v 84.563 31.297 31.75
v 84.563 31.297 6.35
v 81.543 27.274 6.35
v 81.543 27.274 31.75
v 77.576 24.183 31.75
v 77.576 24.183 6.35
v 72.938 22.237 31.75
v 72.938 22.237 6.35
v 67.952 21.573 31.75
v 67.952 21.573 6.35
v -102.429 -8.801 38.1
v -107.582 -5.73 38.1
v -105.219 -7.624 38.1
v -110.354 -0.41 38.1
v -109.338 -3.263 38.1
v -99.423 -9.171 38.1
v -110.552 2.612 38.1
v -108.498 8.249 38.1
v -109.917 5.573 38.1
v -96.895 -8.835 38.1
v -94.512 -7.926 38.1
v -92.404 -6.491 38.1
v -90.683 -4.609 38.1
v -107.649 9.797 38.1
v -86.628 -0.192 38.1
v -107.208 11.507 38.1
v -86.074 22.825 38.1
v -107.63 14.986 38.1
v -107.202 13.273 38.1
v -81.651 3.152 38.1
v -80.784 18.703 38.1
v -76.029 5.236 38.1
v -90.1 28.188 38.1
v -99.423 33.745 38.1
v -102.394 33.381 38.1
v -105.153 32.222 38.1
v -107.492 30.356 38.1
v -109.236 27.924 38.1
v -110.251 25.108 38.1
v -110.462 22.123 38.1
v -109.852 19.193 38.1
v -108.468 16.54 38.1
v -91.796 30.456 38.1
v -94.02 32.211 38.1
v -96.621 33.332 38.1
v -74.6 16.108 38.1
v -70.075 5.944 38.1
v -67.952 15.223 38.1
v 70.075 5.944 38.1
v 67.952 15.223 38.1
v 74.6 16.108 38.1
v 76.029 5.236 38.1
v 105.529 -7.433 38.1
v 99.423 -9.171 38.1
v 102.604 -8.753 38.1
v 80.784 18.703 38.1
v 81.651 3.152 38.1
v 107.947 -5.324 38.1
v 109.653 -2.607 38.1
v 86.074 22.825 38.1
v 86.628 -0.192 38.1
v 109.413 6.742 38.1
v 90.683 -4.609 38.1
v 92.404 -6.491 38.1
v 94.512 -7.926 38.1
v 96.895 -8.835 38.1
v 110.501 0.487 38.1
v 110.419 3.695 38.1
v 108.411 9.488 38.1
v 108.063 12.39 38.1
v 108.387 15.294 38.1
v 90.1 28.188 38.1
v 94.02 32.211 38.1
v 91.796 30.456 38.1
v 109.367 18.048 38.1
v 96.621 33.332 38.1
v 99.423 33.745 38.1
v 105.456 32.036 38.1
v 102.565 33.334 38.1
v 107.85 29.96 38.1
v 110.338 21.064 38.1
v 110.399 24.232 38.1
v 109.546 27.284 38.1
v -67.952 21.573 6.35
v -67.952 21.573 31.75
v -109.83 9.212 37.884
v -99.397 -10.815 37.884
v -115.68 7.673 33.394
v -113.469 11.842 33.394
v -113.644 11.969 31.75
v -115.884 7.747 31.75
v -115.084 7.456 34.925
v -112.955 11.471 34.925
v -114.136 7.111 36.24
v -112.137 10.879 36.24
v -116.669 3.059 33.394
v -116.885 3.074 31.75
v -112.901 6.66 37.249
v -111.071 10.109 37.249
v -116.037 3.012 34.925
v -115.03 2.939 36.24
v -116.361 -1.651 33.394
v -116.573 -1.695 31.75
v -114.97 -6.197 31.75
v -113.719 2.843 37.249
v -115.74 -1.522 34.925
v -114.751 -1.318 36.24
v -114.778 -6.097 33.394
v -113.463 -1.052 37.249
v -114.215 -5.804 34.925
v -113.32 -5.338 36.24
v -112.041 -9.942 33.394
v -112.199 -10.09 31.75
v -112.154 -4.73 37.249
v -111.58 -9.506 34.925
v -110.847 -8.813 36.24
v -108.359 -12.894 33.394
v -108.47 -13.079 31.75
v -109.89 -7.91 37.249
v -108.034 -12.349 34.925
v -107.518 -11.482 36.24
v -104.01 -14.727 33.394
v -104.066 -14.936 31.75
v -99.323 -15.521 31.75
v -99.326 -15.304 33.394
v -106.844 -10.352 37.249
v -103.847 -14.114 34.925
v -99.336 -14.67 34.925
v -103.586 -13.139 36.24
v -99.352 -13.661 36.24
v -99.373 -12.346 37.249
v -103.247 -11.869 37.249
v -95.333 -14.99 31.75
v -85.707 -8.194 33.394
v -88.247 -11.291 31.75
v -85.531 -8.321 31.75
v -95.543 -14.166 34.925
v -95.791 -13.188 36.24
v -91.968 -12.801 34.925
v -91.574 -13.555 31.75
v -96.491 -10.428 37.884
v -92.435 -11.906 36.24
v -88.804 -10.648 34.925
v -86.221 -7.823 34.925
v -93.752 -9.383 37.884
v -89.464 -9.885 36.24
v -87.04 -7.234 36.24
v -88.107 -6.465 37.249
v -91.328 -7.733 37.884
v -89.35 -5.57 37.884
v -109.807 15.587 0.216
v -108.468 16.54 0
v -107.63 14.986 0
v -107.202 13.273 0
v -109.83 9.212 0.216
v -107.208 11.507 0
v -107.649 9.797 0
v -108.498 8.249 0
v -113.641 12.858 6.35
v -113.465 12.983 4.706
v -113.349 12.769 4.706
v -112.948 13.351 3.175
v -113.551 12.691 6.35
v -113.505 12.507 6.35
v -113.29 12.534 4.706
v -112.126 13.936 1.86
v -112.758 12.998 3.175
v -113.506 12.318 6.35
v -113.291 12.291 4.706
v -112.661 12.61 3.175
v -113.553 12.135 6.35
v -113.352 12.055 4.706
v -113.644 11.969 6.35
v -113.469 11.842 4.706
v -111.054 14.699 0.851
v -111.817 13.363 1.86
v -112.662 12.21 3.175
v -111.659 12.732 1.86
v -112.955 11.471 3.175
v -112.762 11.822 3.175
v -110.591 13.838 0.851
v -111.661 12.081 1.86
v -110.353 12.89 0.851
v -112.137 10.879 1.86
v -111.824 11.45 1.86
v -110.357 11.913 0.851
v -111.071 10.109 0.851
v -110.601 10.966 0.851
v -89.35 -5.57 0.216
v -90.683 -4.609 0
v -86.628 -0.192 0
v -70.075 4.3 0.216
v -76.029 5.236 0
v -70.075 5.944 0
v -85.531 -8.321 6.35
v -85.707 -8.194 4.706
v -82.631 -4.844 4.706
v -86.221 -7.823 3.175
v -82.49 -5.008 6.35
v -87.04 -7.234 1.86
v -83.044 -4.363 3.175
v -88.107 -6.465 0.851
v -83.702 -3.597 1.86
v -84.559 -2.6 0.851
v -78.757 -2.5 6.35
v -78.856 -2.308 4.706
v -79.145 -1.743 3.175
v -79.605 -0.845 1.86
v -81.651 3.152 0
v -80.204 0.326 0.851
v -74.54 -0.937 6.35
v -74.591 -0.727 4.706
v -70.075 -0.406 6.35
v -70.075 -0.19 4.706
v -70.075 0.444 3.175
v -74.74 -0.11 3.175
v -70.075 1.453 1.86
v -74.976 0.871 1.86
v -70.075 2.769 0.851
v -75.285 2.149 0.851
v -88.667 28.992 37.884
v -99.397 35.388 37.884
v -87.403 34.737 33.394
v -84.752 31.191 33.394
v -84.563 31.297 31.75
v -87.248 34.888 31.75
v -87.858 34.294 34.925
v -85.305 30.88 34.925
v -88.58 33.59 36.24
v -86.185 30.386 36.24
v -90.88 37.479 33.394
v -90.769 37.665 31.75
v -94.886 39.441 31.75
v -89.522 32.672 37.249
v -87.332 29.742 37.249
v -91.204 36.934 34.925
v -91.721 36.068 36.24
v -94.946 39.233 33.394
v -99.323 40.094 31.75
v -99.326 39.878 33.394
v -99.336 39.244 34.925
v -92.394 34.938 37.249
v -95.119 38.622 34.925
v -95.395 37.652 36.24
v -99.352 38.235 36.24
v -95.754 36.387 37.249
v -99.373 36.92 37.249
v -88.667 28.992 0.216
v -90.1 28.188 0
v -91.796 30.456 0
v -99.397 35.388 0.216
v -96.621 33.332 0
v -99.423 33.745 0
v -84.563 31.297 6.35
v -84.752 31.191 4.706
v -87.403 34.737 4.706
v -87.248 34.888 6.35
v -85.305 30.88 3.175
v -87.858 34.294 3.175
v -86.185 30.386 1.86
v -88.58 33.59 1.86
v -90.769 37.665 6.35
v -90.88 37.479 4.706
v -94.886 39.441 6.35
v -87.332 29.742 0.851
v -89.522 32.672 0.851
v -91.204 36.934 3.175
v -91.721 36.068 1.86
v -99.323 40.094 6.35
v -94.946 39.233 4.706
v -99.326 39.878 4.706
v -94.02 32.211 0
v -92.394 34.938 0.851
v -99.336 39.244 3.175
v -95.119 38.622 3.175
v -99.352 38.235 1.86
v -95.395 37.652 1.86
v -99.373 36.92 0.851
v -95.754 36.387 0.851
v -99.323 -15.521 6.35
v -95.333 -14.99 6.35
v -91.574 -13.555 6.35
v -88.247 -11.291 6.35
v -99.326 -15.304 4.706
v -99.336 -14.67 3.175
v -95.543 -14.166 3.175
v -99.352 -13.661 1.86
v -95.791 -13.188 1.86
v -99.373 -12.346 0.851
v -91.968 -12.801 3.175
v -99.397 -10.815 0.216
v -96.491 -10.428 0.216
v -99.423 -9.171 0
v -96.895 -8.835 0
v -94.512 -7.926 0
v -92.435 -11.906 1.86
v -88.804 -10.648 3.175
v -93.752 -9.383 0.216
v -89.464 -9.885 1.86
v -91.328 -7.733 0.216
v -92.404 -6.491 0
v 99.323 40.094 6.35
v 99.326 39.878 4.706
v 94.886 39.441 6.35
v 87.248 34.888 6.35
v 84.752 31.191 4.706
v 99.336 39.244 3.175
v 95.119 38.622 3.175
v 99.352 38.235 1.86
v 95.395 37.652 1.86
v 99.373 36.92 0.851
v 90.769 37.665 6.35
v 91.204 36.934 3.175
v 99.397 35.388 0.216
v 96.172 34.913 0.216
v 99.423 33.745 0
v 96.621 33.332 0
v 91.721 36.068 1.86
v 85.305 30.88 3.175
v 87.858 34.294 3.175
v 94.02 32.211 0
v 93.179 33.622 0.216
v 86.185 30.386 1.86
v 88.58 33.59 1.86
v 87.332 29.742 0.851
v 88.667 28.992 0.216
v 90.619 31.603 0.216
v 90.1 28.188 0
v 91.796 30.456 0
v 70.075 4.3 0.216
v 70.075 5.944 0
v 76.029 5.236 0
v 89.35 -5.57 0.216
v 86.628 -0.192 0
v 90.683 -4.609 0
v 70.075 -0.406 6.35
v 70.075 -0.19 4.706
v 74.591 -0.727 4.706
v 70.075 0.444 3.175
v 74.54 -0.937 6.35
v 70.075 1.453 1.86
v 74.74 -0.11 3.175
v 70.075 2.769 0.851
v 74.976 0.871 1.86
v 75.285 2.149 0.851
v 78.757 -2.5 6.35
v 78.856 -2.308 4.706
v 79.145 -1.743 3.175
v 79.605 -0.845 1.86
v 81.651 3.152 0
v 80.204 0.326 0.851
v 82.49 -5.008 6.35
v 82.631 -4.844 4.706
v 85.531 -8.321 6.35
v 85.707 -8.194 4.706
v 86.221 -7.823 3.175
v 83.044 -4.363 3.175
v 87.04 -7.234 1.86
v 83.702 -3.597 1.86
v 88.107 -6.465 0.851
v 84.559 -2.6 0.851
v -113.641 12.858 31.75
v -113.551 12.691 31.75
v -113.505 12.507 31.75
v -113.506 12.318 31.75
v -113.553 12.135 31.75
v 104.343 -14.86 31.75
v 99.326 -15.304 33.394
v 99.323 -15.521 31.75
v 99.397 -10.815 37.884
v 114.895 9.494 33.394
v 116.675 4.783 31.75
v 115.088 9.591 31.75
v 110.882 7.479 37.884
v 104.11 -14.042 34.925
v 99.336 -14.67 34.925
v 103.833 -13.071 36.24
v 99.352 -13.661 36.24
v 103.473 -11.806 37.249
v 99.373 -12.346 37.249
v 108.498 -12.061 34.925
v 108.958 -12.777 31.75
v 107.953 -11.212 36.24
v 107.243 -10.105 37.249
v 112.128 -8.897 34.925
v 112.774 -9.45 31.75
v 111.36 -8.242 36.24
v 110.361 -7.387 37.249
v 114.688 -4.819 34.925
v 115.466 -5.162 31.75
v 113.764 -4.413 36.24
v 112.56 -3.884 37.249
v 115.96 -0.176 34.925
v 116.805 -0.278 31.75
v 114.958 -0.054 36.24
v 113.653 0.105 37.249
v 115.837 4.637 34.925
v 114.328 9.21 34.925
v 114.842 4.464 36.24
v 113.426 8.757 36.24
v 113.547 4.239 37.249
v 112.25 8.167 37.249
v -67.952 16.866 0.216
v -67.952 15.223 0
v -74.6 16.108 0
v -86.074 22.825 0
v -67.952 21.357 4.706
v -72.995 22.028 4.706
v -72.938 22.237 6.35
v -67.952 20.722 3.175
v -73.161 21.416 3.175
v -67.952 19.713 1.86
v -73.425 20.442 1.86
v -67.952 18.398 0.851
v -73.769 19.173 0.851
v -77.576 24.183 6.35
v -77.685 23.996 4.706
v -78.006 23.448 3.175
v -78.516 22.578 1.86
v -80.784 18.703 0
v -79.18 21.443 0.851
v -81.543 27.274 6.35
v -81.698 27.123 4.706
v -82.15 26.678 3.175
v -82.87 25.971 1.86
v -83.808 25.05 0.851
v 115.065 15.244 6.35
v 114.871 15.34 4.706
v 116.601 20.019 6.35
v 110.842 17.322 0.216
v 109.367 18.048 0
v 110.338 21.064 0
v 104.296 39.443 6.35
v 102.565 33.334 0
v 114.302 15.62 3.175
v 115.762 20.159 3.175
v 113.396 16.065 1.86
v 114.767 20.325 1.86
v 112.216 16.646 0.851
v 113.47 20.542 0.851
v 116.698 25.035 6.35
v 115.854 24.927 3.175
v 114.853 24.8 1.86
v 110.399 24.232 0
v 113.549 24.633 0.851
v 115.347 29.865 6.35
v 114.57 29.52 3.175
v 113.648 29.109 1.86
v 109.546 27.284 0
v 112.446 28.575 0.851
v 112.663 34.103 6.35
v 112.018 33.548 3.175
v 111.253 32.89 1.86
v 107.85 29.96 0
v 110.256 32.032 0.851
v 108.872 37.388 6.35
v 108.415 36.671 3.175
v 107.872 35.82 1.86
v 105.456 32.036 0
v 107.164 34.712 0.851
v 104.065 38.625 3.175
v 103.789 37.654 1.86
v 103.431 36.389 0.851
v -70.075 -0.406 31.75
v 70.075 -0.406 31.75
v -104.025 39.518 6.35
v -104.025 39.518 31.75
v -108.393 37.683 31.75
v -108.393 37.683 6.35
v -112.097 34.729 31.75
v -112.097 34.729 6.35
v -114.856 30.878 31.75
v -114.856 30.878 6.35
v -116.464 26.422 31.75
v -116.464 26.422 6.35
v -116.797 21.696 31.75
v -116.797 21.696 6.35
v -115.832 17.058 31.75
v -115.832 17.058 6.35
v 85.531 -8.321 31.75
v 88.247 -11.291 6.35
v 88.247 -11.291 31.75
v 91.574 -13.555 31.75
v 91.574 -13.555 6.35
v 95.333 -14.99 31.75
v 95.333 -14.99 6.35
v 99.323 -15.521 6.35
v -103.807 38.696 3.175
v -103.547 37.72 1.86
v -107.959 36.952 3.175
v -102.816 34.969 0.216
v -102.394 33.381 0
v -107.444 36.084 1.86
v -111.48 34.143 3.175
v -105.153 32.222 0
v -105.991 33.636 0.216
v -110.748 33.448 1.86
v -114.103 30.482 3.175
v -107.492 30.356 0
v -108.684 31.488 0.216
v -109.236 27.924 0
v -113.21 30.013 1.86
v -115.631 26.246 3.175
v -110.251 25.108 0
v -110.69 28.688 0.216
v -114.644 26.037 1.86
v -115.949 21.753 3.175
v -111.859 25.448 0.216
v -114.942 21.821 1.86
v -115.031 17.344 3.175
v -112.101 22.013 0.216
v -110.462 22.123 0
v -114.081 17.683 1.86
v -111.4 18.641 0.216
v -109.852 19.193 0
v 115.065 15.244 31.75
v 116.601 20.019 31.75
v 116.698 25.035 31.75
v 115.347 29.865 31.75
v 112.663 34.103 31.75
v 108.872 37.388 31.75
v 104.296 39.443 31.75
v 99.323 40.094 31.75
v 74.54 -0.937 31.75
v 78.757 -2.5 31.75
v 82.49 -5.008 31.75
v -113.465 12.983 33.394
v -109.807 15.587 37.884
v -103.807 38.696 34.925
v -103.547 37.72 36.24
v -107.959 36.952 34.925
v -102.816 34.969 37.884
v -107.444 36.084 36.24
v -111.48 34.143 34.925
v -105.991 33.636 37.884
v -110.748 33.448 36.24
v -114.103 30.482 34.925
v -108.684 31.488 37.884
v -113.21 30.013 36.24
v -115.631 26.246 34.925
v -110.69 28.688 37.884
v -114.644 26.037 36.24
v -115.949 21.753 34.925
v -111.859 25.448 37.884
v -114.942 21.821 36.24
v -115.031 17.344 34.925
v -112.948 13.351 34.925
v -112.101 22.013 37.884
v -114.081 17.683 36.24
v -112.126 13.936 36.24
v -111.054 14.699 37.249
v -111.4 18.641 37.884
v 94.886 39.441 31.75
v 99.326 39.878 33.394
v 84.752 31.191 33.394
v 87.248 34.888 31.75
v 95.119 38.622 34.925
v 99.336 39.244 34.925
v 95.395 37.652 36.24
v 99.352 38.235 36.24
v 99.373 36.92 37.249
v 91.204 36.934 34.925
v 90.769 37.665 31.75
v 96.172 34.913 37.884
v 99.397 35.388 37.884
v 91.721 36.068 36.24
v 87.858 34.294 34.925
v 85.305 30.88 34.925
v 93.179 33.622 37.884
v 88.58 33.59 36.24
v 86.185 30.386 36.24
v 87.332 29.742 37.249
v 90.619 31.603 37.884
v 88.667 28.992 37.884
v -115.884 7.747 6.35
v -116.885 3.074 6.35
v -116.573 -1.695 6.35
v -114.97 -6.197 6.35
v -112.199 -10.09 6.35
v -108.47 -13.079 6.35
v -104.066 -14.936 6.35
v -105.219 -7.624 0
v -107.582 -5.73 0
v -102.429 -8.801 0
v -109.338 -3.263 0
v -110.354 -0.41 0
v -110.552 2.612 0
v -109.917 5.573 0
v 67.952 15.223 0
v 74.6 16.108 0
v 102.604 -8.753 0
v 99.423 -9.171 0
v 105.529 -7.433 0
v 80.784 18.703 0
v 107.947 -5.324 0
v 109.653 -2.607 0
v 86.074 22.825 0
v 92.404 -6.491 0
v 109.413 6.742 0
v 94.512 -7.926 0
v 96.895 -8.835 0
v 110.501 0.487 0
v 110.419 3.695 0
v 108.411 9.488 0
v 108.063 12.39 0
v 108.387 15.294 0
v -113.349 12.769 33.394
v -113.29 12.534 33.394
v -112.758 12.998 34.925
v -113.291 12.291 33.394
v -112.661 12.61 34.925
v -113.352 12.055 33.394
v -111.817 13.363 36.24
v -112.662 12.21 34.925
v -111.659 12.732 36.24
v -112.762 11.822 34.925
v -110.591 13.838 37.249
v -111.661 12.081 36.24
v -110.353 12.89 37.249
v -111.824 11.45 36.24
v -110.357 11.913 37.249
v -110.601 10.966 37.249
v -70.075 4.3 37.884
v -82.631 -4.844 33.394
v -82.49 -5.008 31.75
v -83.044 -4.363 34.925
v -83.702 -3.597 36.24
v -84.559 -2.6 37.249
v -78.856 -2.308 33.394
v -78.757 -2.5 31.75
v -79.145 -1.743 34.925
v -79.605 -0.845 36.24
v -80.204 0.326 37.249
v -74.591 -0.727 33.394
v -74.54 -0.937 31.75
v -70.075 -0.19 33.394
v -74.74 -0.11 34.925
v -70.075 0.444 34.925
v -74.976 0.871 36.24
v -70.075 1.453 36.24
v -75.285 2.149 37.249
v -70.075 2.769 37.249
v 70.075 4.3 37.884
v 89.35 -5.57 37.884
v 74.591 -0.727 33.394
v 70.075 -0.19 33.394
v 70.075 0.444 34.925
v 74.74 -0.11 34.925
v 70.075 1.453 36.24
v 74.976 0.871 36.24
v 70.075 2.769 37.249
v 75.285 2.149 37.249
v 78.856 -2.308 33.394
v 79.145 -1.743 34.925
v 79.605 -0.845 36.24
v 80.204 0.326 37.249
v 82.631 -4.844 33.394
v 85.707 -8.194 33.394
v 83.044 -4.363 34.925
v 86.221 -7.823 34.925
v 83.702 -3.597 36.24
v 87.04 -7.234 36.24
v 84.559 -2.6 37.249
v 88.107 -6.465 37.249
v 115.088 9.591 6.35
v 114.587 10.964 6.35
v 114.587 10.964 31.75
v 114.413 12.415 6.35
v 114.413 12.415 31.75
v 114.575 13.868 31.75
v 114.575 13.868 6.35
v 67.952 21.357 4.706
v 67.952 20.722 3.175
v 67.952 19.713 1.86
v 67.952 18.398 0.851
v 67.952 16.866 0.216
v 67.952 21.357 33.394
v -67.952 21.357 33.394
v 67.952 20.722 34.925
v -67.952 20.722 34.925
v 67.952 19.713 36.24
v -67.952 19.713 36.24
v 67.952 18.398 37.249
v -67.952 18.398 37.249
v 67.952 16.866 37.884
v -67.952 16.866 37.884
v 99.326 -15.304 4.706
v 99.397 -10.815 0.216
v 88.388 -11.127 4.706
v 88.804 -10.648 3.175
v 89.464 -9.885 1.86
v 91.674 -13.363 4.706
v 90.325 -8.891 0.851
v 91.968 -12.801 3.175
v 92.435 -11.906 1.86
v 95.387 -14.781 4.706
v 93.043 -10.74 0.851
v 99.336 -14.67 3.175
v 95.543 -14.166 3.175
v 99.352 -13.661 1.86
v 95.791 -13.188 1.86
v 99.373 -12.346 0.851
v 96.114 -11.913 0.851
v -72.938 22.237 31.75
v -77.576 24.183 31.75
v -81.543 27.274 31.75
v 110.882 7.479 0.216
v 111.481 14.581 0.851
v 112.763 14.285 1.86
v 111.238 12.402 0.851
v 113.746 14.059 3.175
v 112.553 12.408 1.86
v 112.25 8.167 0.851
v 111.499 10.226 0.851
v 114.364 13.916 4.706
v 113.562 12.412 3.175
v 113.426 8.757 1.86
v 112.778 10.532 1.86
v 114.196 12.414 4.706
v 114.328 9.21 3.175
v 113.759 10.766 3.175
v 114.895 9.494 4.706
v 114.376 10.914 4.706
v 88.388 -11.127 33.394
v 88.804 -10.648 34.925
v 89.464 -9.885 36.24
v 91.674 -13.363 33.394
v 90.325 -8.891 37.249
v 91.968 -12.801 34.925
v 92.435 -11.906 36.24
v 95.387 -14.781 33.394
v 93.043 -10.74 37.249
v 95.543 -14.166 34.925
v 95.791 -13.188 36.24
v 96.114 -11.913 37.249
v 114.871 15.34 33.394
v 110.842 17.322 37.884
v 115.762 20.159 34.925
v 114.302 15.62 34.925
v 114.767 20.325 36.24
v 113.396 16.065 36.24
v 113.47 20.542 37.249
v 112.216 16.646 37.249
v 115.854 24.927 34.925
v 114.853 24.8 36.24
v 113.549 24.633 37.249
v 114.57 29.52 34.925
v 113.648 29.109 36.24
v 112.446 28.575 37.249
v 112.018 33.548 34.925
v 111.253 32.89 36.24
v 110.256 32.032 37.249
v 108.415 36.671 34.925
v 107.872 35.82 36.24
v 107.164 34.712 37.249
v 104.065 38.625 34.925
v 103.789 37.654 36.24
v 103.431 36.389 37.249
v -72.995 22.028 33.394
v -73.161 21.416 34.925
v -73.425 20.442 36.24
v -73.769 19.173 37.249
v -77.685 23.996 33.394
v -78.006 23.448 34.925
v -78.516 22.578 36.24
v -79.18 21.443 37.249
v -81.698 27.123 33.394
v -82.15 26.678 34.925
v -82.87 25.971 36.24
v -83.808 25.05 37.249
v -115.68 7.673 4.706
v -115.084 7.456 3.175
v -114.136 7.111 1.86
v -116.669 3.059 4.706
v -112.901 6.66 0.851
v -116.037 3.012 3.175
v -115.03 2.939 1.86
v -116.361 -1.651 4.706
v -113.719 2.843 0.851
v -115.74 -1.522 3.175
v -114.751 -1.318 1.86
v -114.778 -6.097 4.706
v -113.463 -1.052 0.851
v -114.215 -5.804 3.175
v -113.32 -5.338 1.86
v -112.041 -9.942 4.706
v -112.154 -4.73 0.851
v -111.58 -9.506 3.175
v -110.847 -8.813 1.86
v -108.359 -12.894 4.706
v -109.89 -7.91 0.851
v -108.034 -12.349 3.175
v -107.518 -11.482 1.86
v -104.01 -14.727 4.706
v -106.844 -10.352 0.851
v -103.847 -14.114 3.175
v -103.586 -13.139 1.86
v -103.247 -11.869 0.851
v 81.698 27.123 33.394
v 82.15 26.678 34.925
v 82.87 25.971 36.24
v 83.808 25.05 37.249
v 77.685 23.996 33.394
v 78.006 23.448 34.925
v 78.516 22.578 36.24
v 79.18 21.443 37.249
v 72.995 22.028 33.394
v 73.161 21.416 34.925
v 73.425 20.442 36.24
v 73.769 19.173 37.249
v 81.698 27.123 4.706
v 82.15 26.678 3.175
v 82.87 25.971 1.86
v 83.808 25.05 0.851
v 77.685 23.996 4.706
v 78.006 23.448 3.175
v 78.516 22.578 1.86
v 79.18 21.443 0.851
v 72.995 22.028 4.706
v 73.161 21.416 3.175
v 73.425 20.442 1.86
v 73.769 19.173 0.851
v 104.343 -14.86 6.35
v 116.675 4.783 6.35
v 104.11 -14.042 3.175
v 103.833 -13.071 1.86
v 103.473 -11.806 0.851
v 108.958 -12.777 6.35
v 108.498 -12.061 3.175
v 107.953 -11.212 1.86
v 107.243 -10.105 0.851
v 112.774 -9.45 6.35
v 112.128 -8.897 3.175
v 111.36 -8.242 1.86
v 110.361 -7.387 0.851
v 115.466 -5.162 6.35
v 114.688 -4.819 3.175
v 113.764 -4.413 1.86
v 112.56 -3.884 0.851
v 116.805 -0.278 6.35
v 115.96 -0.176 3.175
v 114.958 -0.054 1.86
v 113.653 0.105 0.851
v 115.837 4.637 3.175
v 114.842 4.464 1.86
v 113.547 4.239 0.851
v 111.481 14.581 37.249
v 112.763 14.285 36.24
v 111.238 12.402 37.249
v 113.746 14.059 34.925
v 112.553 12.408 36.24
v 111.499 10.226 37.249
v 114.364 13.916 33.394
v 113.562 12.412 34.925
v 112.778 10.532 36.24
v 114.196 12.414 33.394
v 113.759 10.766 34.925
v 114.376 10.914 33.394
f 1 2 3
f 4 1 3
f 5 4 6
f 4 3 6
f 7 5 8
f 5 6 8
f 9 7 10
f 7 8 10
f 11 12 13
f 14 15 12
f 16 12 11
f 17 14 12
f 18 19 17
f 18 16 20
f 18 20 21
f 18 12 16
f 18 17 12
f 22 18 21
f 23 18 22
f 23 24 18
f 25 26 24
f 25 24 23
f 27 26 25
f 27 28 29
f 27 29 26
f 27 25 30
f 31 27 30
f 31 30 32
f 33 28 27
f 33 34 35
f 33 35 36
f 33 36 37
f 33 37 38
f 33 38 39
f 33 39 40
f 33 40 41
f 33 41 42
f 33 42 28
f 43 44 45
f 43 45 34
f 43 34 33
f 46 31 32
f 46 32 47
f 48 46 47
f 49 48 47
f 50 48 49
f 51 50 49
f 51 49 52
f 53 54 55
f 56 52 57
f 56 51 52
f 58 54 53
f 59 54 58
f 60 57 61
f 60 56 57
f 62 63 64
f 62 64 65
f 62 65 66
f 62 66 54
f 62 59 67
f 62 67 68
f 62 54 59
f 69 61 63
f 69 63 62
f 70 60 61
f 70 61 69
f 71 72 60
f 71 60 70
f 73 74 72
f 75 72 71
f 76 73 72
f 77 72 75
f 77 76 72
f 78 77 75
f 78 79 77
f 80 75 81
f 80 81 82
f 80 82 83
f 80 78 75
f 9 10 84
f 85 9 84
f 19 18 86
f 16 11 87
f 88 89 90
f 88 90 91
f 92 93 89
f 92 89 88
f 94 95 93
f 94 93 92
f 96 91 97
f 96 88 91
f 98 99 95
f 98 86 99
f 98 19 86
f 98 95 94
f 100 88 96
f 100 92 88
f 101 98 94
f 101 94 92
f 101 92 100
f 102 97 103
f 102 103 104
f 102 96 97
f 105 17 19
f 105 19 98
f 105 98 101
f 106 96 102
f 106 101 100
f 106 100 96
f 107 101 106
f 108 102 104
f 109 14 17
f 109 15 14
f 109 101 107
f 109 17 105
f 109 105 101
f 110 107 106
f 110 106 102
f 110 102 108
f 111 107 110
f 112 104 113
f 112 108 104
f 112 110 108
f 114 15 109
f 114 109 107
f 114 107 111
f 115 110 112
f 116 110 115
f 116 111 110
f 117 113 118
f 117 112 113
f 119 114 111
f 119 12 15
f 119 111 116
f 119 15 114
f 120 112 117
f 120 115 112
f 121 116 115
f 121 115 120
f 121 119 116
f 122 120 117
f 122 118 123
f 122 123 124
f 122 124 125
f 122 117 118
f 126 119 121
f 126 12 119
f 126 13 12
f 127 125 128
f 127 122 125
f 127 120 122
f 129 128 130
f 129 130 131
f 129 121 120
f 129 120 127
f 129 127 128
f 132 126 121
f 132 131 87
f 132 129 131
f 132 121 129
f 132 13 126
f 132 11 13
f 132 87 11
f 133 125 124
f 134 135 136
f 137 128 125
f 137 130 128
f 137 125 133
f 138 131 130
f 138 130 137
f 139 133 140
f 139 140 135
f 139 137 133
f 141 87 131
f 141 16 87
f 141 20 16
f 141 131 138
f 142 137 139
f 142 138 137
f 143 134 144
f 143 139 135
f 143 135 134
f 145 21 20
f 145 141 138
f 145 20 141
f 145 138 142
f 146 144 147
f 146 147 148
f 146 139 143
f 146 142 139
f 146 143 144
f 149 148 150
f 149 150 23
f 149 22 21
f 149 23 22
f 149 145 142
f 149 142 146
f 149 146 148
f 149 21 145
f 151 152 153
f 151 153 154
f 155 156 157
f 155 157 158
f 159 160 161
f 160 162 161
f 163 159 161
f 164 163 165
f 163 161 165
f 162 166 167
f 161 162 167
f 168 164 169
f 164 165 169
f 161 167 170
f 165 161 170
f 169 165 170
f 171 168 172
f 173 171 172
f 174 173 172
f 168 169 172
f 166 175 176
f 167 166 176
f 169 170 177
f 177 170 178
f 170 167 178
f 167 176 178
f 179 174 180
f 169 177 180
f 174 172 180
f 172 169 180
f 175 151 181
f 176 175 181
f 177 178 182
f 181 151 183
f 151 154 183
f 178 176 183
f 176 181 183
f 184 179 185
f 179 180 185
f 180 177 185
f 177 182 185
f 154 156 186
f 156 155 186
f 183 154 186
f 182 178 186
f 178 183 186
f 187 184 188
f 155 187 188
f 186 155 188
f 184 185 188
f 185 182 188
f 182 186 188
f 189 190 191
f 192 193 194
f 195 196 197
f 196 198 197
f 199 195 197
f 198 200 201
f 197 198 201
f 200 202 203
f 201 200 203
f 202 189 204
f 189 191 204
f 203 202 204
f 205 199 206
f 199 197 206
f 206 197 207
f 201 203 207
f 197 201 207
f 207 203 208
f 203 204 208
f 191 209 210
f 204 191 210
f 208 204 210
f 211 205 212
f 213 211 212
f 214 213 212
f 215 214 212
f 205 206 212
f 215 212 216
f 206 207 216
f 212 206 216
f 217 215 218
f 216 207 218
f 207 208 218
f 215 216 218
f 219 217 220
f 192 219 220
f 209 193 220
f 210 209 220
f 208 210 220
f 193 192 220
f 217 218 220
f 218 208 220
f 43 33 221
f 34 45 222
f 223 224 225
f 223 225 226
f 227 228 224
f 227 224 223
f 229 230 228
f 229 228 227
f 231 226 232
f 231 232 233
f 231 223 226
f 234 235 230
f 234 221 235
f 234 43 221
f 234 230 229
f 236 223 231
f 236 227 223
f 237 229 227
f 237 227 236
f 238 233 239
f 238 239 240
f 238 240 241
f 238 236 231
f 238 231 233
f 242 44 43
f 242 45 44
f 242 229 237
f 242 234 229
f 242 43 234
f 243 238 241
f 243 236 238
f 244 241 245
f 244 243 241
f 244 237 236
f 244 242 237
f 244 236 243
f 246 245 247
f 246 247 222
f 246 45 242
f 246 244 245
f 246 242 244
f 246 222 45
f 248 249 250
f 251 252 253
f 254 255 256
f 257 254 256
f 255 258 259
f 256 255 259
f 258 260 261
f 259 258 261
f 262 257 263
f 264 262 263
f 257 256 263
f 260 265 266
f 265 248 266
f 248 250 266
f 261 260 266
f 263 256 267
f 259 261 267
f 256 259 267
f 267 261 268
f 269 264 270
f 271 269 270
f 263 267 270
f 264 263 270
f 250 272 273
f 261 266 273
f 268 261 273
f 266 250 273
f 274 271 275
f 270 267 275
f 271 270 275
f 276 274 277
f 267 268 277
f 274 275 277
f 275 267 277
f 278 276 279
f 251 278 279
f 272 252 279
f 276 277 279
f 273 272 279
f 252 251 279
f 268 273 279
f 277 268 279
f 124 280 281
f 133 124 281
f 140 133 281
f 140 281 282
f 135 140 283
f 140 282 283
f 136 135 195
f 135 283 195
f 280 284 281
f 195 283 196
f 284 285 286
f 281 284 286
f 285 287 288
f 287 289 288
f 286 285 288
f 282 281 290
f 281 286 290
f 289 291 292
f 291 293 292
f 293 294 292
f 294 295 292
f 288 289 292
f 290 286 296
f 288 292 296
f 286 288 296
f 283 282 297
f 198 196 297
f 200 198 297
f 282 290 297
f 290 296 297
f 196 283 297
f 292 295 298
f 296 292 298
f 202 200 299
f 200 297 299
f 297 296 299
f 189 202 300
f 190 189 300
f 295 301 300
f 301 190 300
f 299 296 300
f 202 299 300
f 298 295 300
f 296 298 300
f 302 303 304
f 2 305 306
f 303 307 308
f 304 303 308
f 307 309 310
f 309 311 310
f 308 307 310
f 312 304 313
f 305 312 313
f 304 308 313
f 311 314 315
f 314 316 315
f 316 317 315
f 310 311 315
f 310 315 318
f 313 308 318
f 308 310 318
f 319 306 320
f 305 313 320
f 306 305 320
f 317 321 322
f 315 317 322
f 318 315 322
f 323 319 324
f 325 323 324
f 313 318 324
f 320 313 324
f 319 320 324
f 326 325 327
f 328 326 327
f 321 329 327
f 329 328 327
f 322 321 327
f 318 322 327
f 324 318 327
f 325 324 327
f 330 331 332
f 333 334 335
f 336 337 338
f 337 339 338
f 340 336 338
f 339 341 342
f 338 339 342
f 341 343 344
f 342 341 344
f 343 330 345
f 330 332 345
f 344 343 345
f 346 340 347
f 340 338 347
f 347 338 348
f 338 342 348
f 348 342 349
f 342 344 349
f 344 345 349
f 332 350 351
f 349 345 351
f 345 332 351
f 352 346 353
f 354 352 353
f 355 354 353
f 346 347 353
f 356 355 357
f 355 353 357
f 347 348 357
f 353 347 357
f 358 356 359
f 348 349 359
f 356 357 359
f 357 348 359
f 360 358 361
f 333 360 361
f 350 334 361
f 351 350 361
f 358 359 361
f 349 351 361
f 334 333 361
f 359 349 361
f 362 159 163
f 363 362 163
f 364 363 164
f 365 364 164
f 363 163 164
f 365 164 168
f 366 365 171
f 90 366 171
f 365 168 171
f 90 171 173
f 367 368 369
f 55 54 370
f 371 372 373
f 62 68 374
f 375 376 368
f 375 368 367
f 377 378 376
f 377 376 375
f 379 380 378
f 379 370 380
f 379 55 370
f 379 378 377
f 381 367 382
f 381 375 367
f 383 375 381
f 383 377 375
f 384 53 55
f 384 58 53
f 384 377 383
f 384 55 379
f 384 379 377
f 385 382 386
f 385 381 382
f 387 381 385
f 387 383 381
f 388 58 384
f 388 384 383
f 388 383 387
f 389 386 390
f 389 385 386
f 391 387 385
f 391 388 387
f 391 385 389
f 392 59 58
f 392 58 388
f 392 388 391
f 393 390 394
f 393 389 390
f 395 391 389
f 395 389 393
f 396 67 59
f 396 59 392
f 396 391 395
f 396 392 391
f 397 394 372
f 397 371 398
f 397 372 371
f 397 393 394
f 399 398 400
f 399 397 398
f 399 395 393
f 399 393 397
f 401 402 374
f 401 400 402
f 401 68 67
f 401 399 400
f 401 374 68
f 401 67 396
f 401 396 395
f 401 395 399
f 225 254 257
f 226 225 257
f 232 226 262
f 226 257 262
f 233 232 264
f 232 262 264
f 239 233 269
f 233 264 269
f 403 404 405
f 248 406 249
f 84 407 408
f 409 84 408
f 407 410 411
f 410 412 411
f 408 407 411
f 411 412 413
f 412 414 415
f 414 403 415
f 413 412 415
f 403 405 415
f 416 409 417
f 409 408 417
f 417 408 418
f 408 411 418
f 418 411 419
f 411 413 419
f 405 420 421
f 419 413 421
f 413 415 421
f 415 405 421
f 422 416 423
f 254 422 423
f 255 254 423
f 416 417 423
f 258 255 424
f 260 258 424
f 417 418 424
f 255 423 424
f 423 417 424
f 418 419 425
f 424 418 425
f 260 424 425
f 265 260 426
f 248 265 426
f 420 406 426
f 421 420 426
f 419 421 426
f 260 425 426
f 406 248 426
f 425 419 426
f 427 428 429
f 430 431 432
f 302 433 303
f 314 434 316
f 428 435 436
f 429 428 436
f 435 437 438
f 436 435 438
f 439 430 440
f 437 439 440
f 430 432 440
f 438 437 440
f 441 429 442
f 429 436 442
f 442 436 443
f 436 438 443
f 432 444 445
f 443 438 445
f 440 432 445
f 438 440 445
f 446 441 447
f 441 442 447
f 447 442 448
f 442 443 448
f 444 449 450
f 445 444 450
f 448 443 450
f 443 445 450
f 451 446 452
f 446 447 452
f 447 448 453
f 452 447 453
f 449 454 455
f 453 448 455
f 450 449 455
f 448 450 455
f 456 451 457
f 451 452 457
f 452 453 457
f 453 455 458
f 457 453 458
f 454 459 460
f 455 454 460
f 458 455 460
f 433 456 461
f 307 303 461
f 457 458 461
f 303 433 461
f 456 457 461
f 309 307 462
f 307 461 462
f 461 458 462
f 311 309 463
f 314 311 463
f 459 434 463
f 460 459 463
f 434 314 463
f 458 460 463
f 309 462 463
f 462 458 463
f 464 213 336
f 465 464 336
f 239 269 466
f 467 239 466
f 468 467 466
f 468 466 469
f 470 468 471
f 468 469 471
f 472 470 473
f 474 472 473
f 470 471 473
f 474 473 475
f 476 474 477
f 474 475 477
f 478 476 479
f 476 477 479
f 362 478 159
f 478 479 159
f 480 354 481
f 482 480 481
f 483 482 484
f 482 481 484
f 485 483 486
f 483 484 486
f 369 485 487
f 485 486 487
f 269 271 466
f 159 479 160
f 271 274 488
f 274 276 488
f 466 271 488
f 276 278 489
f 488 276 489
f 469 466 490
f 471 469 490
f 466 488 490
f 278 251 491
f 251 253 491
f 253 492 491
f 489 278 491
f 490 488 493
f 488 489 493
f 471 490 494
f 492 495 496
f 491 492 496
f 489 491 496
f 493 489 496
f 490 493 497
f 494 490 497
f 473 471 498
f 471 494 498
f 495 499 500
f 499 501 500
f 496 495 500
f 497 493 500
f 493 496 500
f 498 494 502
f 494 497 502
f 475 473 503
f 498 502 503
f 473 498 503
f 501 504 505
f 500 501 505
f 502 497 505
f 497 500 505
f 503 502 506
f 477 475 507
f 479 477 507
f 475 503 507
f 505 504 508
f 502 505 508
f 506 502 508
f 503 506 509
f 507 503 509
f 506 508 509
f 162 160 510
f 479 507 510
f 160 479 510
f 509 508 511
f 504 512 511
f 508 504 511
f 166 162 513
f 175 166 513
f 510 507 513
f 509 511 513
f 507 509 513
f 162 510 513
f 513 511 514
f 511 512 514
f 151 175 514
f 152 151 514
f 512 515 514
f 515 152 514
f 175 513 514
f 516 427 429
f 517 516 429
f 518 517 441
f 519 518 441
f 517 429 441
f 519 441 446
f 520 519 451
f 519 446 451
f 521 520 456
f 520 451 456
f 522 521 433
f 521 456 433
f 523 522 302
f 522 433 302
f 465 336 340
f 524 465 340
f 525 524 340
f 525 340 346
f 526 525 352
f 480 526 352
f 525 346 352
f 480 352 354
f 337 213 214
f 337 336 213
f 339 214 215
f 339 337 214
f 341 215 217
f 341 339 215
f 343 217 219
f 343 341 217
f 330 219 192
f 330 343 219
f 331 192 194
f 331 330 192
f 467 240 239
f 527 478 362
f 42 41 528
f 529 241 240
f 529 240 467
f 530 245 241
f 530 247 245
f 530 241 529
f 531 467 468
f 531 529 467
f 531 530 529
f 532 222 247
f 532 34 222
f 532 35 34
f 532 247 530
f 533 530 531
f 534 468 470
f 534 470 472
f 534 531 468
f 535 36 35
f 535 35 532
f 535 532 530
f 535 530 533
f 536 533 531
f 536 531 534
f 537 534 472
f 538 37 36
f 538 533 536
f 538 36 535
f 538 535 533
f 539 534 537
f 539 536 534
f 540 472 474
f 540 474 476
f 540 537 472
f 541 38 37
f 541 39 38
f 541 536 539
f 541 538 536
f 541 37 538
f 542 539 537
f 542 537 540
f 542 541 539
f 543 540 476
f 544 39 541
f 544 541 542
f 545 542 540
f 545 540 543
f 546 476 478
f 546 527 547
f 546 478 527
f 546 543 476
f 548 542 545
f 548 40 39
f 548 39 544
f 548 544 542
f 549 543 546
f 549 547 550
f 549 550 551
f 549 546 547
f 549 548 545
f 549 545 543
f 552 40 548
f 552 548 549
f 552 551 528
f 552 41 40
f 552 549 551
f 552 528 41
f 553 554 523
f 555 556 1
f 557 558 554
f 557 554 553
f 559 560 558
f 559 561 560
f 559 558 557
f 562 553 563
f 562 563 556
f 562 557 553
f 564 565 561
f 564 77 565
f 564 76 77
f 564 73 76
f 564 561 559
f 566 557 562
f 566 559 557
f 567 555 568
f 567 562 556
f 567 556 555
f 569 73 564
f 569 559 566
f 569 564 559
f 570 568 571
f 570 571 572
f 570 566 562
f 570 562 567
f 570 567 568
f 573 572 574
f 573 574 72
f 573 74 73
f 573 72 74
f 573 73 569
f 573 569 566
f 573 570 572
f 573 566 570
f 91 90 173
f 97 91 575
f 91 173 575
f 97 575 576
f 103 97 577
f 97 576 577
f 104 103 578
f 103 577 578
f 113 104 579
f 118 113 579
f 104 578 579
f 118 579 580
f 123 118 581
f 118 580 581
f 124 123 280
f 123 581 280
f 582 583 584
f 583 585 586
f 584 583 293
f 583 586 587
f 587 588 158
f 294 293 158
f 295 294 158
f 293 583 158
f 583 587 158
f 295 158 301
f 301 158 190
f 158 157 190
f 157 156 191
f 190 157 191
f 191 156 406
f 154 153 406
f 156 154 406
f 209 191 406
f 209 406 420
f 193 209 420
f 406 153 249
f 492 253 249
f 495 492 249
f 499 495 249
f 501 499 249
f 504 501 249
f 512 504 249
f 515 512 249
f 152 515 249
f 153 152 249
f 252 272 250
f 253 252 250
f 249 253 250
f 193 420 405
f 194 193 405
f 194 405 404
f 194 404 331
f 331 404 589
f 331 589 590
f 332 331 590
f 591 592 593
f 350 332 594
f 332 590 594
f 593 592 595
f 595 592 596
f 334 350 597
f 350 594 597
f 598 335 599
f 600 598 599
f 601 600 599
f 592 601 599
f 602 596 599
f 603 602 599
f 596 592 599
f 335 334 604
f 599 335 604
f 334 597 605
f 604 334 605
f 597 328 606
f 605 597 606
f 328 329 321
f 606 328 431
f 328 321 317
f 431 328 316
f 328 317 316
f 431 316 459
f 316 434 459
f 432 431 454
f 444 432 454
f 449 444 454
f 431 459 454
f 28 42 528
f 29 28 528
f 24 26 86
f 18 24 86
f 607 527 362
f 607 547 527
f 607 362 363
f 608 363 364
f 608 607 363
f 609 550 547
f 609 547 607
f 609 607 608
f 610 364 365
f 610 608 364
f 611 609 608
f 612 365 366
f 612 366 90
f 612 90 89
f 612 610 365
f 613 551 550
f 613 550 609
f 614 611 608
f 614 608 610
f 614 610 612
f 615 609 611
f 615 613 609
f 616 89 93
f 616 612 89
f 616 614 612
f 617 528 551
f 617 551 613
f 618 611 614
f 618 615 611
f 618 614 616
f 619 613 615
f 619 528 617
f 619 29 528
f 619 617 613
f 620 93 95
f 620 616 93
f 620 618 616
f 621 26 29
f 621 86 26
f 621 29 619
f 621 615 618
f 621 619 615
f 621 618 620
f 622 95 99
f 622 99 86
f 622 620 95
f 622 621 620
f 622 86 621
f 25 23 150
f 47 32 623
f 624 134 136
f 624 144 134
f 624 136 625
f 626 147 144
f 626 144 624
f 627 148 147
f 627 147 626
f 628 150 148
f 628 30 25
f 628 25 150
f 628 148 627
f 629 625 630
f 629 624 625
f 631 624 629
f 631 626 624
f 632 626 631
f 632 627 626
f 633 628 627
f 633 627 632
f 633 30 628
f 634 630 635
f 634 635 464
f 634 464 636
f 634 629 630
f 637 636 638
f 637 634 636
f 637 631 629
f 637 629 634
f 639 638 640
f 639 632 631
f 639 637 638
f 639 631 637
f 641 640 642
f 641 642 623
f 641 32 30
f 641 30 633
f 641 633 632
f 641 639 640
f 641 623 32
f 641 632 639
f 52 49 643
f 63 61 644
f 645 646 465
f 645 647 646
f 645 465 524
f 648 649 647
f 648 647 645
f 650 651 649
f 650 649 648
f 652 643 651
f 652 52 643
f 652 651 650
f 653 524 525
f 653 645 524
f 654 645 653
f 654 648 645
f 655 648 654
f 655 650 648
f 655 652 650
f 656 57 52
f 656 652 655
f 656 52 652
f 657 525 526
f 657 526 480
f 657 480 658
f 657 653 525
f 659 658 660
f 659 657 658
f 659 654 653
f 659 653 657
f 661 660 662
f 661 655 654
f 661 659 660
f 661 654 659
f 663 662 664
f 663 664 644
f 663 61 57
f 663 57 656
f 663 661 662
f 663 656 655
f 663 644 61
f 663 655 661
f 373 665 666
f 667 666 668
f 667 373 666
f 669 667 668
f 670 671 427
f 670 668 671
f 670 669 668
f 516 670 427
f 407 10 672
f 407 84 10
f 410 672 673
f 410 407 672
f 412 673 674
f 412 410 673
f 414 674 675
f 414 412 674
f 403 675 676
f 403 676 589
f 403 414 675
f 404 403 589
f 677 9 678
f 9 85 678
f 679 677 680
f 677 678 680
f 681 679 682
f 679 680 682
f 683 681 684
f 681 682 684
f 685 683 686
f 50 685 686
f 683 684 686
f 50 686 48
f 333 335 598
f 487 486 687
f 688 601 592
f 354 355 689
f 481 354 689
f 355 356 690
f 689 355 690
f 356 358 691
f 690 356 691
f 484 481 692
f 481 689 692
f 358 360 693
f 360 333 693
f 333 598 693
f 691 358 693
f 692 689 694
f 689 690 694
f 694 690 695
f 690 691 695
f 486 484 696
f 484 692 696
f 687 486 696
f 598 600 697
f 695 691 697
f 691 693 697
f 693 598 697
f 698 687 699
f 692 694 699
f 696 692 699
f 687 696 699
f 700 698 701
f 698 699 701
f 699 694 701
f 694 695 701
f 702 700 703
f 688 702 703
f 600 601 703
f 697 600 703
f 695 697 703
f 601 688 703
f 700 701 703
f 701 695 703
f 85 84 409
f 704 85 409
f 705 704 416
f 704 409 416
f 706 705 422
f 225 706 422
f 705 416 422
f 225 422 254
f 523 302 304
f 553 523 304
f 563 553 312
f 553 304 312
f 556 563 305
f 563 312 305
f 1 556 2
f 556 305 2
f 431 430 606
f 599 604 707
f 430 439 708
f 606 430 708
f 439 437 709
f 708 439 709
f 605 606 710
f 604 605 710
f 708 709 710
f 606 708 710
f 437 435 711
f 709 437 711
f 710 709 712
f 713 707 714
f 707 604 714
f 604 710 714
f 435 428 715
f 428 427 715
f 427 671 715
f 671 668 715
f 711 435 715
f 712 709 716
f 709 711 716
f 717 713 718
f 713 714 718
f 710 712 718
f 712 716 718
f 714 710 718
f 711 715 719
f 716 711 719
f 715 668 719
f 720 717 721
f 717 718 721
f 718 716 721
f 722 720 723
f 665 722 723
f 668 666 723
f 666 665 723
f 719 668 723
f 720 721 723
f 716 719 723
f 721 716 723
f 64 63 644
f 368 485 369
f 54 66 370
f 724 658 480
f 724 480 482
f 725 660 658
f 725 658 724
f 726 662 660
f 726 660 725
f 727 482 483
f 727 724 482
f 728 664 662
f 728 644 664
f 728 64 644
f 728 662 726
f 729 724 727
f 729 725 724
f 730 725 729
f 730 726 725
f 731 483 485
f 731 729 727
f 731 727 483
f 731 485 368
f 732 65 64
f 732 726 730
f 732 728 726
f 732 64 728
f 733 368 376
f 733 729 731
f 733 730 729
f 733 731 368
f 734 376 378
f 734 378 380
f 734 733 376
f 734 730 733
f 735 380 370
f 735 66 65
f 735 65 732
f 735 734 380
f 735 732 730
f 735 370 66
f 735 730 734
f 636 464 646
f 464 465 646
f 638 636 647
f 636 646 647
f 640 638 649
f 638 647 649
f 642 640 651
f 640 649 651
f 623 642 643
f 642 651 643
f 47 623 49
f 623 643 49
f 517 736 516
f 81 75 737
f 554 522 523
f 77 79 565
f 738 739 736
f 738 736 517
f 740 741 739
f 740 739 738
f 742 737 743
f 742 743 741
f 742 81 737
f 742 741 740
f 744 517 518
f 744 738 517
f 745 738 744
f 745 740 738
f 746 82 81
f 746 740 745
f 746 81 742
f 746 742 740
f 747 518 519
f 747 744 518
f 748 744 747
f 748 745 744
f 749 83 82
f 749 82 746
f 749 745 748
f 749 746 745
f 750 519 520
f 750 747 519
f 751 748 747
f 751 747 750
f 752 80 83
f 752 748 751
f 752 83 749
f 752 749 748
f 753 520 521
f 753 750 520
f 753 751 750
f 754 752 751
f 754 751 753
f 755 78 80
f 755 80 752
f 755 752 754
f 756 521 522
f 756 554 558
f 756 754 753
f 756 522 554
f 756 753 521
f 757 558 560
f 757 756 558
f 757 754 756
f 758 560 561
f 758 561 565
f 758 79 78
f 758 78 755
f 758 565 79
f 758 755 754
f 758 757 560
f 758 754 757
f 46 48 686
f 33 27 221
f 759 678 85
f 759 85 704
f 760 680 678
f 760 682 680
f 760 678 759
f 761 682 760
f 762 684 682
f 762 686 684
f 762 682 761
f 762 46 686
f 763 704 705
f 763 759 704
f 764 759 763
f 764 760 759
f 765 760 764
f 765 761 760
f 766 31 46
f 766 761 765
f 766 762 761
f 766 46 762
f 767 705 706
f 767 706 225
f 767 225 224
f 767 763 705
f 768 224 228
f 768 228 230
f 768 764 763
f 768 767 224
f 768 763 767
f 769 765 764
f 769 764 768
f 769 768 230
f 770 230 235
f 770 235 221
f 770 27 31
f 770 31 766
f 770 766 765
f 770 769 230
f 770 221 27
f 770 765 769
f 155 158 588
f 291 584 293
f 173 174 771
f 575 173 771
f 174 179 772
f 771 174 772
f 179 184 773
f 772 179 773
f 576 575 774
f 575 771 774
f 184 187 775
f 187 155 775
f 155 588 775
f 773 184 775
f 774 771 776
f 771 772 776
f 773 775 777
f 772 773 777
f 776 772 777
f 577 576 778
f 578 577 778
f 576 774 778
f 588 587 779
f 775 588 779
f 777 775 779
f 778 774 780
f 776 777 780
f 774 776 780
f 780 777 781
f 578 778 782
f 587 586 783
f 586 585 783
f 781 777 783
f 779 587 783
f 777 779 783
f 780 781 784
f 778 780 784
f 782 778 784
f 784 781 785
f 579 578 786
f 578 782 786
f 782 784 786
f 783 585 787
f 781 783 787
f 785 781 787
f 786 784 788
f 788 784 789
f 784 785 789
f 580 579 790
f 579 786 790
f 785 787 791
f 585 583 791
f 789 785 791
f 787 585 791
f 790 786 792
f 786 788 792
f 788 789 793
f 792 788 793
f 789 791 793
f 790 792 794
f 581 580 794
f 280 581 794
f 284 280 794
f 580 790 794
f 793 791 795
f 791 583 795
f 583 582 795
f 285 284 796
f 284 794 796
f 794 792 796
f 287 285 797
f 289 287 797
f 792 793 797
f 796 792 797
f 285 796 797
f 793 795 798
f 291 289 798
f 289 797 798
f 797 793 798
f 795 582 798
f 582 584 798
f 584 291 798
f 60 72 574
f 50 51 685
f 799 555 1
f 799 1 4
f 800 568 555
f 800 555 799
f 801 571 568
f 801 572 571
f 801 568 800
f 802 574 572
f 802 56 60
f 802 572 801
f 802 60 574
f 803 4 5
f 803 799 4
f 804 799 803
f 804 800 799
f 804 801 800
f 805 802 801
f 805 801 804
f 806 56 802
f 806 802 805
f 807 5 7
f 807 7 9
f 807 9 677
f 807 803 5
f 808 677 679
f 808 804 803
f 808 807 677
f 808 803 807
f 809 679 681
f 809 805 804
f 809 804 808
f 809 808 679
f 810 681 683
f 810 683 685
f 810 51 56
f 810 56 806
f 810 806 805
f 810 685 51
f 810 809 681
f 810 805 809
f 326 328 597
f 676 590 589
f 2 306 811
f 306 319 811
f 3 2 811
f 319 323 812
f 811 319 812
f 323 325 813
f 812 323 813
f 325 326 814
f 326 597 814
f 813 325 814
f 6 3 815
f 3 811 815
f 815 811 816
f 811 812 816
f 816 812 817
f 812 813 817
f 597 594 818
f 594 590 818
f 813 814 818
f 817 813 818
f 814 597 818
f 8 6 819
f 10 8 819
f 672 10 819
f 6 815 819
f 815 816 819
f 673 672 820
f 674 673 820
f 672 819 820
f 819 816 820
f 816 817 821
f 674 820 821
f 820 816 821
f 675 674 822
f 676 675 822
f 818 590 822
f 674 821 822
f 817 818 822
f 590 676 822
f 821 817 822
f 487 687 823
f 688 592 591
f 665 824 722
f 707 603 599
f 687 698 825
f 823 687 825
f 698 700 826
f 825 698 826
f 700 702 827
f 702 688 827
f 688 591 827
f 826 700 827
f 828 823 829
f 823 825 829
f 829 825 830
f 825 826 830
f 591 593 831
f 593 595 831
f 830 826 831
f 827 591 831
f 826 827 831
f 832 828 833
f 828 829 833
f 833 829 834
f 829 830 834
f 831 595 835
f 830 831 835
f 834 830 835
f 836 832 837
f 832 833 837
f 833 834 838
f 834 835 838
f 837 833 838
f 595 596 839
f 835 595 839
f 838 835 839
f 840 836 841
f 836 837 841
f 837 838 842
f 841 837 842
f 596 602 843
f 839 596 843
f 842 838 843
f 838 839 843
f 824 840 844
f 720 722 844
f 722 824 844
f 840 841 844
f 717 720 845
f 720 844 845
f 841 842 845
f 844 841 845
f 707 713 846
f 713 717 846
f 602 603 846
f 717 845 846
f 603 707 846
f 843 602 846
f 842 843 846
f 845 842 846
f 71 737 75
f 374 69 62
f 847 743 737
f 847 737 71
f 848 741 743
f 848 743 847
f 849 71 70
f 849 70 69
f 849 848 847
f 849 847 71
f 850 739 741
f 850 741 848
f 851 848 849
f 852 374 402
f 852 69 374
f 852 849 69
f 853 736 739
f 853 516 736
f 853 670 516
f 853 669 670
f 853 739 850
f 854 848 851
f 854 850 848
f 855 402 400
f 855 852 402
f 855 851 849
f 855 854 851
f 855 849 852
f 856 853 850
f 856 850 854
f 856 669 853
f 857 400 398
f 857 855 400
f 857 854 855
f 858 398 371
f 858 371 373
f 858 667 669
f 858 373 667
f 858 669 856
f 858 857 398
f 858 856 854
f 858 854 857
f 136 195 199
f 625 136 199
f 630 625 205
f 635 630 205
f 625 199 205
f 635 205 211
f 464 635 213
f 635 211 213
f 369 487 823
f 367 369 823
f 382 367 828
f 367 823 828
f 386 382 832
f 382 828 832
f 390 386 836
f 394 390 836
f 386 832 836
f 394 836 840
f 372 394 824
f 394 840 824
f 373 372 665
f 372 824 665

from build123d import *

# Parameters (mm, degrees)
F1_DEPTH = 12.7
F2_SCALE = 3
F3_R     = 6.35


with BuildPart() as f1:
    # F0 (on Top) → F1 (new body)
    with BuildSketch(Plane.XY):
        with BuildLine():
            Line((22.650744566, 7.190999575), (0, 7.190999575))
            Line((0, 7.190999575), (-22.650744566, 7.190999575))
            ThreePointArc((-22.650744566, 7.190999575), (-25.858668803, 8.0608789477), (-28.1876931588, 10.432189468))
            ThreePointArc((-28.1876931588, 10.432189468), (-30.2562615135, 12.5550773402), (-33.1075824797, 13.3647666037))
            ThreePointArc((-33.1075824797, 13.3647666037), (-38.2854180827, 10.2927602437), (-37.8803053875, 4.2858402083))
            ThreePointArc((-37.8803053875, 4.2858402083), (-37.833228654, 4.137603143), (-37.8813892603, 3.9897146635))
            ThreePointArc((-37.8813892603, 3.9897146635), (-38.3233098407, -2.0656424962), (-33.1075824797, -5.1735086816))
            ThreePointArc((-33.1075824797, -5.1735086816), (-30.5246049962, -4.5182552091), (-28.51033034, -2.7735983939))
            ThreePointArc((-28.51033034, -2.7735983939), (-26.2523403785, -0.8333702379), (-23.3582126367, -0.1354959101))
            Line((-23.3582126367, -0.1354959101), (0, -0.1354959101))
            Line((0, -0.1354959101), (23.3582126367, -0.1354959101))
            ThreePointArc((23.3582126367, -0.1354959101), (26.2523403785, -0.8333702379), (28.51033034, -2.7735983939))
            ThreePointArc((28.51033034, -2.7735983939), (30.5246049962, -4.5182552091), (33.1075824797, -5.1735086816))
            ThreePointArc((33.1075824797, -5.1735086816), (38.3652517819, -1.983544068), (37.7709929375, 4.1373886349))
            ThreePointArc((37.7709929375, 4.1373886349), (38.3276553946, 10.2108253524), (33.1075824797, 13.3647666037))
            ThreePointArc((33.1075824797, 13.3647666037), (30.2562615135, 12.5550773402), (28.1876931588, 10.432189468))
            ThreePointArc((28.1876931588, 10.432189468), (25.858668803, 8.0608789477), (22.650744566, 7.190999575))
        make_face()
    extrude(amount=F1_DEPTH)


with BuildPart() as f1_1:
    # F2: moved
    add(f1.part.scale(F2_SCALE))

    # F3
    f3_edges = [f1_1.edges().sort_by_distance(p)[0] for p in [
        (77.576006, 24.182637, 0),
        (0, 21.572999, 0),
        (-77.576006, 24.182637, 0),
        (-108.828758, 37.41586, 0),
        (-113.499686, 12.412809, 0),
        (-109.740982, -12.244098, 0),
        (-78.757021, -2.500111, 0),
        (0, -0.406488, 0),
        (78.757021, -2.500111, 0),
        (109.96395, -12.080456, 0),
        (109.061108, 37.265895, 0),
        (113.312979, 12.412166, 19.05),
        (77.576006, 24.182637, 38.1),
        (0, 21.572999, 38.1),
        (-77.576006, 24.182637, 38.1),
        (-108.828758, 37.41586, 38.1),
        (-113.499686, 12.412809, 38.1),
        (-109.740982, -12.244098, 38.1),
        (-78.757021, -2.500111, 38.1),
        (0, -0.406488, 38.1),
        (78.757021, -2.500111, 38.1),
        (109.96395, -12.080456, 38.1),
        (109.061108, 37.265895, 38.1),
    ]]
    fillet(f3_edges, radius=F3_R)


solid = f1_1.part
